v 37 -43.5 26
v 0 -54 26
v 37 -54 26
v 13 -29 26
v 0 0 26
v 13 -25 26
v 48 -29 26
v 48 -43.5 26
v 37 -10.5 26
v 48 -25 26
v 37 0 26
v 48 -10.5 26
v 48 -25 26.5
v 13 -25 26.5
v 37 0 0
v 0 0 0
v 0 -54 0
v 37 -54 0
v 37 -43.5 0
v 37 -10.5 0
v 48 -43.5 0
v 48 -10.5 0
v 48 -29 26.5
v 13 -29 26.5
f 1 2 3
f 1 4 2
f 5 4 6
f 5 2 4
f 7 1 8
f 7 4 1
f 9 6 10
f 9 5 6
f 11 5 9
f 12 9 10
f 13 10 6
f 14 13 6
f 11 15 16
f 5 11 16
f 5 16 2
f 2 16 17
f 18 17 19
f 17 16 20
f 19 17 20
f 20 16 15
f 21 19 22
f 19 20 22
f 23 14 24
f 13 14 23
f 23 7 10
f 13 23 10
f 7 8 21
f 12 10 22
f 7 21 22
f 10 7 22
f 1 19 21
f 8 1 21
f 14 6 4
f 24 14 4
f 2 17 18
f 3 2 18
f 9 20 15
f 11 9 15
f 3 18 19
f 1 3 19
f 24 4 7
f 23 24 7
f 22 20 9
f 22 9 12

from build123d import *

# Parameters (mm, degrees)
F0_W     = 11
F0_H     = 14.5
F1_DEPTH = 26
F2_DEPTH = 26.5


with BuildPart() as f1:
    # F0 (on Top) → F1 (new body)
    with BuildSketch(Plane.XY):
        Polygon((37, 0), (0, 0), (0, -54), (37, -54), (37, -43.5), (37, -29), (13, -29), (13, -25), (37, -25), (37, -10.5), align=None)
        with Locations((42.5, -17.75)):
            Rectangle(F0_W, F0_H)
        with Locations((42.5, -36.25)):
            Rectangle(F0_W, F0_H)
    extrude(amount=F1_DEPTH)

    # F0 (on Top) → F2 (join)
    with BuildSketch(Plane.XY):
        Polygon((37, -27), (37, -25), (13, -25), (13, -29), (37, -29), align=None)
        Polygon((48, -25), (37, -25), (37, -27), (37, -29), (48, -29), align=None)
    extrude(amount=F2_DEPTH)


solid = f1.part
